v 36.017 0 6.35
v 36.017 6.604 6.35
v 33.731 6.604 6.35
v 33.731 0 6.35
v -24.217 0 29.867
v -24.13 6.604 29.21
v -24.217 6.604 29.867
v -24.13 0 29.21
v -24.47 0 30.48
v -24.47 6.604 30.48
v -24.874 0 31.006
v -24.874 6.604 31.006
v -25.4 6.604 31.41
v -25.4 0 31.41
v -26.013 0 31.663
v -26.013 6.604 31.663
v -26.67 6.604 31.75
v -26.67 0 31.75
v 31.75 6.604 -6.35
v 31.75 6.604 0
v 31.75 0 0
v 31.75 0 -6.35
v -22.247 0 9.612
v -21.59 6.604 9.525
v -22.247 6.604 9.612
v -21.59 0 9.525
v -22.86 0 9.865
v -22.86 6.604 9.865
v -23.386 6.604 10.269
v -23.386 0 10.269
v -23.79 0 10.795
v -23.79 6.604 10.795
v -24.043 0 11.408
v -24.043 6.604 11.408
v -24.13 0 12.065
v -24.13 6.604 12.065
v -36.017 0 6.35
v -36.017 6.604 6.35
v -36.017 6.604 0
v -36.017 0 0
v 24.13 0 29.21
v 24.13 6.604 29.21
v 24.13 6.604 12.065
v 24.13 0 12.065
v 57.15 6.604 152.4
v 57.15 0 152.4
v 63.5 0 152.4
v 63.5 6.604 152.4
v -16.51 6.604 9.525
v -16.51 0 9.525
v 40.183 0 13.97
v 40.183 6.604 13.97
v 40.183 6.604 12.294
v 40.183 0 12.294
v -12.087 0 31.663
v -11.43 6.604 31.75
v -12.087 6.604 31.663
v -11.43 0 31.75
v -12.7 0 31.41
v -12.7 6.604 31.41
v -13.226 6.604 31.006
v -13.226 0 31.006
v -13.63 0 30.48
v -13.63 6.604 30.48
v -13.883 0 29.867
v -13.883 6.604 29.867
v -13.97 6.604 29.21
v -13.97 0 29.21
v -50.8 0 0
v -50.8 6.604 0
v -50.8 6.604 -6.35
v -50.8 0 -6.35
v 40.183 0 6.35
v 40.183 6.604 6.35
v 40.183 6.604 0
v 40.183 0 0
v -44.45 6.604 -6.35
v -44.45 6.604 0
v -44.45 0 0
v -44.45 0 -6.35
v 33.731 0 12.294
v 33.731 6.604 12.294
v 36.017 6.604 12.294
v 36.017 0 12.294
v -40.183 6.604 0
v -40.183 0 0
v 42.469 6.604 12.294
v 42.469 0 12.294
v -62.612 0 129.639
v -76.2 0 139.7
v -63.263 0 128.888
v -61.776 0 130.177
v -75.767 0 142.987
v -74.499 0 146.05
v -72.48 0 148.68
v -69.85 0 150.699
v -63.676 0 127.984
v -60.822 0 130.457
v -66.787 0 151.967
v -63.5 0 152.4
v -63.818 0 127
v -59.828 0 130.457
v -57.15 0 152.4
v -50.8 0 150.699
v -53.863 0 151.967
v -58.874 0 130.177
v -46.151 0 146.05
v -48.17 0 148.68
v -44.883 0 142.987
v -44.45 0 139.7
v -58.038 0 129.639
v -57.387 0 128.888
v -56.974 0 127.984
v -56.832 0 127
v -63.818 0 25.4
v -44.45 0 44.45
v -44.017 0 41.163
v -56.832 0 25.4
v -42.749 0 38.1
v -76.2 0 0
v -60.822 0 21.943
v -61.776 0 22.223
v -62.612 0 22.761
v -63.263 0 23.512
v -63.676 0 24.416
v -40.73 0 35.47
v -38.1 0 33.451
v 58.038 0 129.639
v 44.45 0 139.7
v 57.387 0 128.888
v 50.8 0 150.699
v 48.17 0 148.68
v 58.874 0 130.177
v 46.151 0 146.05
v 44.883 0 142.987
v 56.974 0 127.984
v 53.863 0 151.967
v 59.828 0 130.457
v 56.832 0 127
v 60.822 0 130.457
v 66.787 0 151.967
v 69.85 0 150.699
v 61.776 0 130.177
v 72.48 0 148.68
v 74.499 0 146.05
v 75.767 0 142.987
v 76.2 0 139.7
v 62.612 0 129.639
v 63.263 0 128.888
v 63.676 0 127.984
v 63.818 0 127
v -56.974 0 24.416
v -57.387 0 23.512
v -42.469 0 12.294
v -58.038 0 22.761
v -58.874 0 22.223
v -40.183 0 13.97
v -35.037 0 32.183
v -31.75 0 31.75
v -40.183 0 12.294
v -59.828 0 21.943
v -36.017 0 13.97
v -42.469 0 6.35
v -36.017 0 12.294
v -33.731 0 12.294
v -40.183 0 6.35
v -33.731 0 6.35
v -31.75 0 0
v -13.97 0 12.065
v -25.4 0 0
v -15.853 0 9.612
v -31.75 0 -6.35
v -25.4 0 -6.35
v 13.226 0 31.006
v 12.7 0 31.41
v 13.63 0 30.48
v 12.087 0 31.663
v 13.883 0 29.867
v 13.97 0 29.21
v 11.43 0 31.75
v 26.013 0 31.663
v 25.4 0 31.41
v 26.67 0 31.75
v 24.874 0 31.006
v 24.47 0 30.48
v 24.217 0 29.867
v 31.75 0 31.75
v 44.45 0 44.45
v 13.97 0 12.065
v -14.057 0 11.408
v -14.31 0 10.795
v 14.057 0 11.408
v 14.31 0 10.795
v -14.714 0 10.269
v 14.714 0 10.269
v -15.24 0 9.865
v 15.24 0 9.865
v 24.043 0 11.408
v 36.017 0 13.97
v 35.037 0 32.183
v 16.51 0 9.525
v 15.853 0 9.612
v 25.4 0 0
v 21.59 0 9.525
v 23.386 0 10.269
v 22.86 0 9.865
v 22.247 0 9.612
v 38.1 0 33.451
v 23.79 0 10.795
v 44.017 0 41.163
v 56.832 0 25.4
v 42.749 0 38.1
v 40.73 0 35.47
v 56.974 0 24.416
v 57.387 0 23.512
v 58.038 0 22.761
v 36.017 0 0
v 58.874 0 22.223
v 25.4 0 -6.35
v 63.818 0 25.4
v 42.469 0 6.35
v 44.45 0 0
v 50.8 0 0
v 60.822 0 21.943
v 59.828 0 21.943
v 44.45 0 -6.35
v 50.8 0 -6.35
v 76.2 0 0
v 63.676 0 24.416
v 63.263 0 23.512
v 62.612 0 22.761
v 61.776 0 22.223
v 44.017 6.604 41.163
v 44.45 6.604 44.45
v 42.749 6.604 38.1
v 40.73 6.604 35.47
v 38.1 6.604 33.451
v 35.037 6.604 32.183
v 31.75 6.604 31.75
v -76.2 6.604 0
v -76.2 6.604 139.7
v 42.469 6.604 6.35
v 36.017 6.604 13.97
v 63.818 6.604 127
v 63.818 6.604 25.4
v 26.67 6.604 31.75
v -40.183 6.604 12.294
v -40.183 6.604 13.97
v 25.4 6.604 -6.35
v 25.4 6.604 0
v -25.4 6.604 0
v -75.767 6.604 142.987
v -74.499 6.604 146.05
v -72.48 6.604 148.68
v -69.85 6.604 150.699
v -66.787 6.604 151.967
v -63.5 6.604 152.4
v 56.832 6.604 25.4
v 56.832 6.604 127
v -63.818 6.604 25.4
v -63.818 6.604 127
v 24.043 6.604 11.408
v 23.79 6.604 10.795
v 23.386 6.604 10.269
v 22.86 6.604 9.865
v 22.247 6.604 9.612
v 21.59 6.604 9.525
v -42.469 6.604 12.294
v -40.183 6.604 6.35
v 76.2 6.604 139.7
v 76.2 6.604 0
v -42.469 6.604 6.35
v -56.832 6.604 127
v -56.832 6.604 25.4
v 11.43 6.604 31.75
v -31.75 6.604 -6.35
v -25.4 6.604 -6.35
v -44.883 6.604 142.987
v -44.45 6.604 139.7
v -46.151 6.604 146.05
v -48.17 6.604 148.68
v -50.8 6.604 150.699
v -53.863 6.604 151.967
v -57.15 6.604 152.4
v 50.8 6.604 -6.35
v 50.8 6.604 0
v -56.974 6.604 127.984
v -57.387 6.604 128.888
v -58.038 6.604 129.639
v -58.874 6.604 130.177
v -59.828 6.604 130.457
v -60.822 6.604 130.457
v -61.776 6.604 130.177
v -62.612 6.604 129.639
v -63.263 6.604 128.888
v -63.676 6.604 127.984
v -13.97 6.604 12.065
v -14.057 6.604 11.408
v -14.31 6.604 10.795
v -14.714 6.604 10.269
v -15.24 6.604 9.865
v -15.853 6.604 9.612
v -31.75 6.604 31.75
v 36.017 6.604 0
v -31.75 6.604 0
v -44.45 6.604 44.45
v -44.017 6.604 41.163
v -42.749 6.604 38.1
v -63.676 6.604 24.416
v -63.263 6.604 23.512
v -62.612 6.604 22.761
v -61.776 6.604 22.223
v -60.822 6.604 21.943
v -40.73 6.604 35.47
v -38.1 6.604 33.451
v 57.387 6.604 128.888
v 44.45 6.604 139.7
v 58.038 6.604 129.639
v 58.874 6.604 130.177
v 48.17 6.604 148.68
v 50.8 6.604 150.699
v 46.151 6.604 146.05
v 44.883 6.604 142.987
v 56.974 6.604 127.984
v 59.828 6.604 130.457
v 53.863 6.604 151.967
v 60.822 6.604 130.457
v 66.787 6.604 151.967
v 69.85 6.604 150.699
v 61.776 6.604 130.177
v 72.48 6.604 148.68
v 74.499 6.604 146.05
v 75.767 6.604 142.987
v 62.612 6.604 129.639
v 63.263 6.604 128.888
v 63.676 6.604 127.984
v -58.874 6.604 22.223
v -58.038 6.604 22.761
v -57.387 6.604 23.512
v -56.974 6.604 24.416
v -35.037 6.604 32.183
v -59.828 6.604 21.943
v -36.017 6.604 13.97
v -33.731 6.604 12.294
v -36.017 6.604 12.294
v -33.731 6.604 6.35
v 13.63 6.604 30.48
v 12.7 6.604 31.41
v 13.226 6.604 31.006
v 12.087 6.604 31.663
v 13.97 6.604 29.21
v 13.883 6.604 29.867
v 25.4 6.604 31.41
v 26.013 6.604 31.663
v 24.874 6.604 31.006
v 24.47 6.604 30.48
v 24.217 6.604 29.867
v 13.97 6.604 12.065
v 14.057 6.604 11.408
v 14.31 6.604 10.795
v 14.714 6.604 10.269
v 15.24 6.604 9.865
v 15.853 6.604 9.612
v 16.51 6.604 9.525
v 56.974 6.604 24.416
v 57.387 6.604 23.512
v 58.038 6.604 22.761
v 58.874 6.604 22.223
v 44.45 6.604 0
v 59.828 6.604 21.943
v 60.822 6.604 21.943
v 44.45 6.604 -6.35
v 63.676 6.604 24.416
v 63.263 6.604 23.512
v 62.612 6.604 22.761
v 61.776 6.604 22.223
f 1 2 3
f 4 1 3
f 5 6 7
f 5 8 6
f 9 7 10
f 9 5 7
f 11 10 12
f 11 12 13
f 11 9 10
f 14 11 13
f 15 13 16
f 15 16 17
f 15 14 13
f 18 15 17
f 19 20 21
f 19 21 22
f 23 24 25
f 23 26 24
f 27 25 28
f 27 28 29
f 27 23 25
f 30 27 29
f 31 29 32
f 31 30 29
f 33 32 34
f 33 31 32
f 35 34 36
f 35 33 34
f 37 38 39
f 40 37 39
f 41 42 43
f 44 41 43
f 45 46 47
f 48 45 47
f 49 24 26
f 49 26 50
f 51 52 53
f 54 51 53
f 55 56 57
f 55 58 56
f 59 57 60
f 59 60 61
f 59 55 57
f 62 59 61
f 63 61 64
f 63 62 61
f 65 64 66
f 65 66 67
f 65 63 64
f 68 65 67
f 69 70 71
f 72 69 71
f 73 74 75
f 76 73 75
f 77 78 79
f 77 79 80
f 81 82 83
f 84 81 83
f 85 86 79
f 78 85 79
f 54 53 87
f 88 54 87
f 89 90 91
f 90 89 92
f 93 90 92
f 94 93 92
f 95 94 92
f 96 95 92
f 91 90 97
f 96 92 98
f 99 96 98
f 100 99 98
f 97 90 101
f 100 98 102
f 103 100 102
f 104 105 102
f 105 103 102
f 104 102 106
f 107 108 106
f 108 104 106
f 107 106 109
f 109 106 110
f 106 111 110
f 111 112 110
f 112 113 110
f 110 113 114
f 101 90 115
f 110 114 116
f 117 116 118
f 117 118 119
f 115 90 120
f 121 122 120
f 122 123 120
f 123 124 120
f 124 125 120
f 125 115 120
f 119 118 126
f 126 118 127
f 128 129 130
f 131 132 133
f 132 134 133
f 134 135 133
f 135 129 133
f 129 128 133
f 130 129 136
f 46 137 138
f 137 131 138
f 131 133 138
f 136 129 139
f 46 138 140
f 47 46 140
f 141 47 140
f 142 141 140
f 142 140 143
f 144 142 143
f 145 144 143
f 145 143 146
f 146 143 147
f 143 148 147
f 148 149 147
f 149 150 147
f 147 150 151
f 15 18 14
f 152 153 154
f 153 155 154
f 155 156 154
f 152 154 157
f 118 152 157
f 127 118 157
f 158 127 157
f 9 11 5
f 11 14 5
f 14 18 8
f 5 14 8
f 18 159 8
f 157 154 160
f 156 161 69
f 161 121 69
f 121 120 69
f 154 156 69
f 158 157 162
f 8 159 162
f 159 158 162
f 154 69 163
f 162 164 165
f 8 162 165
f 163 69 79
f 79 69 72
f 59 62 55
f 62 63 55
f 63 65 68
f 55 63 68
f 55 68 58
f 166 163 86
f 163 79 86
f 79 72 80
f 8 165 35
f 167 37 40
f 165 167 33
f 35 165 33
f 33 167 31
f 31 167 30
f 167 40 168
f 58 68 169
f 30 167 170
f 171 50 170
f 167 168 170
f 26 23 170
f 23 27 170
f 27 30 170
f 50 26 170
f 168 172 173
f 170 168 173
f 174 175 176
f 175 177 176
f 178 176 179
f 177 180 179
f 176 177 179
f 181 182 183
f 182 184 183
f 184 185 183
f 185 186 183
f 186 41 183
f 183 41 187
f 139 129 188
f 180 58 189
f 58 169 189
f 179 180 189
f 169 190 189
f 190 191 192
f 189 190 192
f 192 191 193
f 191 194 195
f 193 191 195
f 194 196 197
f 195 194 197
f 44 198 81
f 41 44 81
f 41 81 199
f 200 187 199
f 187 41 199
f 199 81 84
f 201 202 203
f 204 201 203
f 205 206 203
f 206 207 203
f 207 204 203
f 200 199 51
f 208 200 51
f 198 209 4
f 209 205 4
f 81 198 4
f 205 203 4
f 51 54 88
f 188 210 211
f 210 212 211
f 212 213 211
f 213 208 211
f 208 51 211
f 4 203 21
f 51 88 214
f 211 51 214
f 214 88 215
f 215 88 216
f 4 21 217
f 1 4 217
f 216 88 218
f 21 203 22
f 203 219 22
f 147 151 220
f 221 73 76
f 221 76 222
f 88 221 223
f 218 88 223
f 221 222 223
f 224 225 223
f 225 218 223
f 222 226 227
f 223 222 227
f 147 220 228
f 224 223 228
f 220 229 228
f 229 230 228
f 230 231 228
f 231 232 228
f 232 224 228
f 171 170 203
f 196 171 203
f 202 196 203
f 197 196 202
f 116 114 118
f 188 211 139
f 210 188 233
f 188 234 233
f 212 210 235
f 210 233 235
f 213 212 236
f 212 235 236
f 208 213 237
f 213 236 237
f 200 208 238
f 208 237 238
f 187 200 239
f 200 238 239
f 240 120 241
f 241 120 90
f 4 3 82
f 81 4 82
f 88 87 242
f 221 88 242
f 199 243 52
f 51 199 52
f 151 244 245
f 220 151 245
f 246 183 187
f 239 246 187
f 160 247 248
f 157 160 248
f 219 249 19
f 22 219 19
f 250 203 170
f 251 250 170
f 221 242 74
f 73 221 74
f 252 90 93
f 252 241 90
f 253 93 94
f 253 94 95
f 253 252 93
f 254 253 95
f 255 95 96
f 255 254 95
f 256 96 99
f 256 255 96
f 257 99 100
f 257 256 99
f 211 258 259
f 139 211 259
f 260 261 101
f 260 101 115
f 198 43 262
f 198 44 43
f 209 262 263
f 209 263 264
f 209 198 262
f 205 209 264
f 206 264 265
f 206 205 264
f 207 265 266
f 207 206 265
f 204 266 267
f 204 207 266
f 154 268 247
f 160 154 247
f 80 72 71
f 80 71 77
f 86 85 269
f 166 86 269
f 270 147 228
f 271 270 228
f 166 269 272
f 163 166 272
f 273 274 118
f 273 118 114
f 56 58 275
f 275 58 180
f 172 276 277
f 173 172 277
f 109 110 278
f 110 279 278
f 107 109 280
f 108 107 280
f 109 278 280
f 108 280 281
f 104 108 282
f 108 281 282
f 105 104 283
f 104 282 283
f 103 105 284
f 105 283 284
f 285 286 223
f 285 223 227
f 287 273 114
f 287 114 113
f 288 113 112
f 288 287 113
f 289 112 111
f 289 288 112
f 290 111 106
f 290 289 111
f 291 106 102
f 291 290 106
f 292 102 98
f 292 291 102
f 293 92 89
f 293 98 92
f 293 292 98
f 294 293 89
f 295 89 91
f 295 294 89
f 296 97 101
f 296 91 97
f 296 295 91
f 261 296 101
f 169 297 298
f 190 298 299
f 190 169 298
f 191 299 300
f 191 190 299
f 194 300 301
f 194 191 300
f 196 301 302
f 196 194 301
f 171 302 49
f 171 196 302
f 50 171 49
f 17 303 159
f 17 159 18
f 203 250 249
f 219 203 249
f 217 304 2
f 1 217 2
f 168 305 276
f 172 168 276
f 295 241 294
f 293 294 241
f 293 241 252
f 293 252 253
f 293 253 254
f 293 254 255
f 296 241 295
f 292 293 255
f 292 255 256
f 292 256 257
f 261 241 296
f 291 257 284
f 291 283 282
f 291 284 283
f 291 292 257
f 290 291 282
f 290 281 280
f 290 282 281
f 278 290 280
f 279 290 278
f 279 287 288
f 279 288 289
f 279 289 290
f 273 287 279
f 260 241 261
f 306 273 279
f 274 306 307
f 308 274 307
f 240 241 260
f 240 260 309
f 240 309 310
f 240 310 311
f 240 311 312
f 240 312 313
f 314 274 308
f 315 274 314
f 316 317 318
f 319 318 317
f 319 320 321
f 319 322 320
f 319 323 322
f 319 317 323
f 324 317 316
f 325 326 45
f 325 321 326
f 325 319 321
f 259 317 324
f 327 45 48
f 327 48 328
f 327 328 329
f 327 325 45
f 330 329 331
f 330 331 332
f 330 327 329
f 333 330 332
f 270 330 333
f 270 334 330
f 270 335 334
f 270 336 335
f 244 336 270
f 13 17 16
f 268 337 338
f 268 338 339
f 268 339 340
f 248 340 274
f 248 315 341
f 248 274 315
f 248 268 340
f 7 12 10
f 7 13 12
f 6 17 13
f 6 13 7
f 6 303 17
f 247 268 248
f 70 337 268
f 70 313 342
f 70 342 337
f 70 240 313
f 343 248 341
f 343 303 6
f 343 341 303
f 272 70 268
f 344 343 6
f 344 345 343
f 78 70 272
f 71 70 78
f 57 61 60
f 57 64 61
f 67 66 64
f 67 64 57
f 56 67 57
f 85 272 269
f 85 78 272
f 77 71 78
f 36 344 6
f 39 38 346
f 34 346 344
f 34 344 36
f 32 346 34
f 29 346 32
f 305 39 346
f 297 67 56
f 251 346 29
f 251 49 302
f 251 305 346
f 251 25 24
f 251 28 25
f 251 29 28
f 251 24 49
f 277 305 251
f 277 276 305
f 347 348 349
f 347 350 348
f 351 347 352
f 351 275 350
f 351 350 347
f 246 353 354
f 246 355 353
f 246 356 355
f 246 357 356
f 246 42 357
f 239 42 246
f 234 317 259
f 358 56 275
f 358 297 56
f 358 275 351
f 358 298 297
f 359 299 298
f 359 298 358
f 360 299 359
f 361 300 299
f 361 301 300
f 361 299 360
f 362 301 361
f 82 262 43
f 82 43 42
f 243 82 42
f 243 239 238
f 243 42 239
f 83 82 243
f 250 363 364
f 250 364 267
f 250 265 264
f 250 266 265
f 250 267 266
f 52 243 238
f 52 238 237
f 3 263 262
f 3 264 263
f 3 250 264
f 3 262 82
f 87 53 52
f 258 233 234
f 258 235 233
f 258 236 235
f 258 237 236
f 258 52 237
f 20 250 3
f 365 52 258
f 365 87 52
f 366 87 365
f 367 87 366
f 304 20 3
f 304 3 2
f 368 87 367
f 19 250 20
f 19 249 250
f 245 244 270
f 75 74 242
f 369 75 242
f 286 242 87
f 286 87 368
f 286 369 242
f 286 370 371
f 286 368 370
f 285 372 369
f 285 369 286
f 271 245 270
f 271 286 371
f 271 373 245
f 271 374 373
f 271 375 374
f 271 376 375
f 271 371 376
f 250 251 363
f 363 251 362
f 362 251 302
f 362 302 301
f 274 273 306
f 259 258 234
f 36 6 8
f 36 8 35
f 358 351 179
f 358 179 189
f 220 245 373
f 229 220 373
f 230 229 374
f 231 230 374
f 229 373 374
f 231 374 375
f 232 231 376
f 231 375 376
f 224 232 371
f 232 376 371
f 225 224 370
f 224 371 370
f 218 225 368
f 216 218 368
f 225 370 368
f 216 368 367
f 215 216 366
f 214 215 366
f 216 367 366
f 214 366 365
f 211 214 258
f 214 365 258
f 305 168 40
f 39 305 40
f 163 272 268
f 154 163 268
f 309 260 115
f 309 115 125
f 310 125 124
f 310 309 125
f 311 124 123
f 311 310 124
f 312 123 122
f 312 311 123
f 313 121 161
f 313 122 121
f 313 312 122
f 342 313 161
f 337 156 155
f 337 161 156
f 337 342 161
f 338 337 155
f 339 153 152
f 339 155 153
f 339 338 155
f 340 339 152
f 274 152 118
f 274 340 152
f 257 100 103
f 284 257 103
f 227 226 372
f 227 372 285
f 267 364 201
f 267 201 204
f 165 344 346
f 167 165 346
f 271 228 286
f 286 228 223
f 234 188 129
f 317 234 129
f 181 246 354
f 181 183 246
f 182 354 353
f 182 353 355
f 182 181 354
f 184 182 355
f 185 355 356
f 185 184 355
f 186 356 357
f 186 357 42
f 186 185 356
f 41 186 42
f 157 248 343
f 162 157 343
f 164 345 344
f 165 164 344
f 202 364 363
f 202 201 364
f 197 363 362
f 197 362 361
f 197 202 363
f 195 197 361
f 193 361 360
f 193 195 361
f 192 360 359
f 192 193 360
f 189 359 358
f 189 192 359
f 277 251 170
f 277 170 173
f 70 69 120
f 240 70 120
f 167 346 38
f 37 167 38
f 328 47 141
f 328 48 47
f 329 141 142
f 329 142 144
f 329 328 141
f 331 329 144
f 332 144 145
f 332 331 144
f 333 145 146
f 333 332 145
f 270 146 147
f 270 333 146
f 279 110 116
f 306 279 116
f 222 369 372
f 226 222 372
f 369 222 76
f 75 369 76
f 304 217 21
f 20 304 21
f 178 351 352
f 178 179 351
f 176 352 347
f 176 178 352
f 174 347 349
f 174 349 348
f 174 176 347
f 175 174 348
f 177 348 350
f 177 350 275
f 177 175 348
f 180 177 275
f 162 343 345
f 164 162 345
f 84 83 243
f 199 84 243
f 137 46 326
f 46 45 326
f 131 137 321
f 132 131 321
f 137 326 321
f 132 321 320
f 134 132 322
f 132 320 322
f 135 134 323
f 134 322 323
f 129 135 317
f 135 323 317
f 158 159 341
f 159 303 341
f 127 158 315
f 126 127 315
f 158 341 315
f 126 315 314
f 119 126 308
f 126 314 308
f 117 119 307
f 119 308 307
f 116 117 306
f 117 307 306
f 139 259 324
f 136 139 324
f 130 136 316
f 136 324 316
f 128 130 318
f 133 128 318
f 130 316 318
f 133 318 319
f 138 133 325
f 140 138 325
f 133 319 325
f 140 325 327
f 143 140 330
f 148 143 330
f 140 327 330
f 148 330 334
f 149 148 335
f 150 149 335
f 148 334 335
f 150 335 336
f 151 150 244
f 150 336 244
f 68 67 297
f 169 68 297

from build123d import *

# Parameters (mm, degrees)
BOSS_EXTRUDE1_DEPTH = 6.604
CUT_EXTRUDE1_DEPTH  = 7.604
FILLET1_R           = 12.7
CUT_EXTRUDE2_DEPTH  = 7.604
SKETCH5_W           = 6.35
SKETCH5_H           = 6.35
BOSS_EXTRUDE2_DEPTH = 6.604
SKETCH6_W           = 10.16
SKETCH6_H           = 22.225
CUT_EXTRUDE5_DEPTH  = 7.604
FILLET2_R           = 2.54


with BuildPart() as part:
    # Sketch1 → Boss-Extrude1 (new body)
    with BuildSketch(Plane(origin=(0, 0, 0), x_dir=(1, 0, 0), z_dir=(0, 1, 0))):
        Polygon((44.45, -152.4), (76.2, -152.4), (76.2, 0), (-76.2, 0), (-76.2, -152.4), (-44.45, -152.4), (-44.45, -31.75), (44.45, -31.75), align=None)
    extrude(amount=BOSS_EXTRUDE1_DEPTH)

    # Sketch2 → Cut-Extrude1 (cut, through all)
    with BuildSketch(Plane(origin=(0, 6.604, 0), x_dir=(1, 0, 0), z_dir=(0, 1, 0))):
        with BuildLine():
            Line((-56.8325, -25.4), (-56.8325, -127))
            ThreePointArc((-56.8325, -127), (-60.325, -130.4925), (-63.8175, -127))
            Line((-63.8175, -127), (-63.8175, -25.4))
            ThreePointArc((-63.8175, -25.4), (-60.325, -21.9075), (-56.8325, -25.4))
        make_face()
        with BuildLine():
            Line((56.8325, -25.4), (56.8325, -127))
            ThreePointArc((56.8325, -127), (60.325, -130.4925), (63.8175, -127))
            Line((63.8175, -127), (63.8175, -25.4))
            ThreePointArc((63.8175, -25.4), (60.325, -21.9075), (56.8325, -25.4))
        make_face()
    extrude(amount=-CUT_EXTRUDE1_DEPTH, mode=Mode.SUBTRACT)

    # Fillet1
    fillet1_edges = [part.edges().sort_by_distance(p)[0] for p in [
        (76.2, 3.302, 152.4),
        (44.45, 3.302, 152.4),
        (44.45, 3.302, 31.75),
        (-44.45, 3.302, 31.75),
        (-44.45, 3.302, 152.4),
        (-76.2, 3.302, 152.4),
    ]]
    fillet(fillet1_edges, radius=FILLET1_R)

    # Sketch4 → Cut-Extrude2 (cut, through all)
    with BuildSketch(Plane(origin=(0, 6.604, 0), x_dir=(1, 0, 0), z_dir=(0, 1, 0))):
        Polygon((-40.1828, 0), (-40.1828, -6.35), (-42.4688, -6.35), (-42.4688, -12.2936), (-40.1828, -12.2936), (-40.1828, -13.97), (-36.0172, -13.97), (-36.0172, -12.2936), (-33.7312, -12.2936), (-33.7312, -6.35), (-36.0172, -6.35), (-36.0172, 0), align=None)
        Polygon((36.0172, 0), (36.0172, -6.35), (33.7312, -6.35), (33.7312, -12.2936), (36.0172, -12.2936), (36.0172, -13.97), (40.1828, -13.97), (40.1828, -12.2936), (42.4688, -12.2936), (42.4688, -6.35), (40.1828, -6.35), (40.1828, 0), align=None)
    extrude(amount=-CUT_EXTRUDE2_DEPTH, mode=Mode.SUBTRACT)

    # Sketch5 → Boss-Extrude2 (add)
    with BuildSketch(Plane(origin=(0, 6.604, 0), x_dir=(1, 0, 0), z_dir=(0, 1, 0))):
        with Locations((-47.625, 3.175)):
            Rectangle(SKETCH5_W, SKETCH5_H)
        with Locations((-28.575, 3.175)):
            Rectangle(SKETCH5_W, SKETCH5_H)
        with Locations((47.625, 3.175)):
            Rectangle(SKETCH5_W, SKETCH5_H)
        with Locations((28.575, 3.175)):
            Rectangle(SKETCH5_W, SKETCH5_H)
    extrude(amount=-BOSS_EXTRUDE2_DEPTH)

    # Sketch6 → Cut-Extrude5 (cut, through all)
    with BuildSketch(Plane(origin=(0, 6.604, 0), x_dir=(1, 0, 0), z_dir=(0, 1, 0))):
        with Locations((-19.05, -20.6375)):
            Rectangle(SKETCH6_W, SKETCH6_H)
        with Locations((19.05, -20.6375)):
            Rectangle(SKETCH6_W, SKETCH6_H)
    extrude(amount=-CUT_EXTRUDE5_DEPTH, mode=Mode.SUBTRACT)

    # Fillet2
    fillet2_edges = [part.edges().sort_by_distance(p)[0] for p in [
        (-24.13, 3.302, 31.75),
        (-24.13, 3.302, 9.525),
        (-13.97, 3.302, 9.525),
        (-13.97, 3.302, 31.75),
        (13.97, 3.302, 31.75),
        (13.97, 3.302, 9.525),
        (24.13, 3.302, 9.525),
        (24.13, 3.302, 31.75),
    ]]
    fillet(fillet2_edges, radius=FILLET2_R)


solid = part.part
